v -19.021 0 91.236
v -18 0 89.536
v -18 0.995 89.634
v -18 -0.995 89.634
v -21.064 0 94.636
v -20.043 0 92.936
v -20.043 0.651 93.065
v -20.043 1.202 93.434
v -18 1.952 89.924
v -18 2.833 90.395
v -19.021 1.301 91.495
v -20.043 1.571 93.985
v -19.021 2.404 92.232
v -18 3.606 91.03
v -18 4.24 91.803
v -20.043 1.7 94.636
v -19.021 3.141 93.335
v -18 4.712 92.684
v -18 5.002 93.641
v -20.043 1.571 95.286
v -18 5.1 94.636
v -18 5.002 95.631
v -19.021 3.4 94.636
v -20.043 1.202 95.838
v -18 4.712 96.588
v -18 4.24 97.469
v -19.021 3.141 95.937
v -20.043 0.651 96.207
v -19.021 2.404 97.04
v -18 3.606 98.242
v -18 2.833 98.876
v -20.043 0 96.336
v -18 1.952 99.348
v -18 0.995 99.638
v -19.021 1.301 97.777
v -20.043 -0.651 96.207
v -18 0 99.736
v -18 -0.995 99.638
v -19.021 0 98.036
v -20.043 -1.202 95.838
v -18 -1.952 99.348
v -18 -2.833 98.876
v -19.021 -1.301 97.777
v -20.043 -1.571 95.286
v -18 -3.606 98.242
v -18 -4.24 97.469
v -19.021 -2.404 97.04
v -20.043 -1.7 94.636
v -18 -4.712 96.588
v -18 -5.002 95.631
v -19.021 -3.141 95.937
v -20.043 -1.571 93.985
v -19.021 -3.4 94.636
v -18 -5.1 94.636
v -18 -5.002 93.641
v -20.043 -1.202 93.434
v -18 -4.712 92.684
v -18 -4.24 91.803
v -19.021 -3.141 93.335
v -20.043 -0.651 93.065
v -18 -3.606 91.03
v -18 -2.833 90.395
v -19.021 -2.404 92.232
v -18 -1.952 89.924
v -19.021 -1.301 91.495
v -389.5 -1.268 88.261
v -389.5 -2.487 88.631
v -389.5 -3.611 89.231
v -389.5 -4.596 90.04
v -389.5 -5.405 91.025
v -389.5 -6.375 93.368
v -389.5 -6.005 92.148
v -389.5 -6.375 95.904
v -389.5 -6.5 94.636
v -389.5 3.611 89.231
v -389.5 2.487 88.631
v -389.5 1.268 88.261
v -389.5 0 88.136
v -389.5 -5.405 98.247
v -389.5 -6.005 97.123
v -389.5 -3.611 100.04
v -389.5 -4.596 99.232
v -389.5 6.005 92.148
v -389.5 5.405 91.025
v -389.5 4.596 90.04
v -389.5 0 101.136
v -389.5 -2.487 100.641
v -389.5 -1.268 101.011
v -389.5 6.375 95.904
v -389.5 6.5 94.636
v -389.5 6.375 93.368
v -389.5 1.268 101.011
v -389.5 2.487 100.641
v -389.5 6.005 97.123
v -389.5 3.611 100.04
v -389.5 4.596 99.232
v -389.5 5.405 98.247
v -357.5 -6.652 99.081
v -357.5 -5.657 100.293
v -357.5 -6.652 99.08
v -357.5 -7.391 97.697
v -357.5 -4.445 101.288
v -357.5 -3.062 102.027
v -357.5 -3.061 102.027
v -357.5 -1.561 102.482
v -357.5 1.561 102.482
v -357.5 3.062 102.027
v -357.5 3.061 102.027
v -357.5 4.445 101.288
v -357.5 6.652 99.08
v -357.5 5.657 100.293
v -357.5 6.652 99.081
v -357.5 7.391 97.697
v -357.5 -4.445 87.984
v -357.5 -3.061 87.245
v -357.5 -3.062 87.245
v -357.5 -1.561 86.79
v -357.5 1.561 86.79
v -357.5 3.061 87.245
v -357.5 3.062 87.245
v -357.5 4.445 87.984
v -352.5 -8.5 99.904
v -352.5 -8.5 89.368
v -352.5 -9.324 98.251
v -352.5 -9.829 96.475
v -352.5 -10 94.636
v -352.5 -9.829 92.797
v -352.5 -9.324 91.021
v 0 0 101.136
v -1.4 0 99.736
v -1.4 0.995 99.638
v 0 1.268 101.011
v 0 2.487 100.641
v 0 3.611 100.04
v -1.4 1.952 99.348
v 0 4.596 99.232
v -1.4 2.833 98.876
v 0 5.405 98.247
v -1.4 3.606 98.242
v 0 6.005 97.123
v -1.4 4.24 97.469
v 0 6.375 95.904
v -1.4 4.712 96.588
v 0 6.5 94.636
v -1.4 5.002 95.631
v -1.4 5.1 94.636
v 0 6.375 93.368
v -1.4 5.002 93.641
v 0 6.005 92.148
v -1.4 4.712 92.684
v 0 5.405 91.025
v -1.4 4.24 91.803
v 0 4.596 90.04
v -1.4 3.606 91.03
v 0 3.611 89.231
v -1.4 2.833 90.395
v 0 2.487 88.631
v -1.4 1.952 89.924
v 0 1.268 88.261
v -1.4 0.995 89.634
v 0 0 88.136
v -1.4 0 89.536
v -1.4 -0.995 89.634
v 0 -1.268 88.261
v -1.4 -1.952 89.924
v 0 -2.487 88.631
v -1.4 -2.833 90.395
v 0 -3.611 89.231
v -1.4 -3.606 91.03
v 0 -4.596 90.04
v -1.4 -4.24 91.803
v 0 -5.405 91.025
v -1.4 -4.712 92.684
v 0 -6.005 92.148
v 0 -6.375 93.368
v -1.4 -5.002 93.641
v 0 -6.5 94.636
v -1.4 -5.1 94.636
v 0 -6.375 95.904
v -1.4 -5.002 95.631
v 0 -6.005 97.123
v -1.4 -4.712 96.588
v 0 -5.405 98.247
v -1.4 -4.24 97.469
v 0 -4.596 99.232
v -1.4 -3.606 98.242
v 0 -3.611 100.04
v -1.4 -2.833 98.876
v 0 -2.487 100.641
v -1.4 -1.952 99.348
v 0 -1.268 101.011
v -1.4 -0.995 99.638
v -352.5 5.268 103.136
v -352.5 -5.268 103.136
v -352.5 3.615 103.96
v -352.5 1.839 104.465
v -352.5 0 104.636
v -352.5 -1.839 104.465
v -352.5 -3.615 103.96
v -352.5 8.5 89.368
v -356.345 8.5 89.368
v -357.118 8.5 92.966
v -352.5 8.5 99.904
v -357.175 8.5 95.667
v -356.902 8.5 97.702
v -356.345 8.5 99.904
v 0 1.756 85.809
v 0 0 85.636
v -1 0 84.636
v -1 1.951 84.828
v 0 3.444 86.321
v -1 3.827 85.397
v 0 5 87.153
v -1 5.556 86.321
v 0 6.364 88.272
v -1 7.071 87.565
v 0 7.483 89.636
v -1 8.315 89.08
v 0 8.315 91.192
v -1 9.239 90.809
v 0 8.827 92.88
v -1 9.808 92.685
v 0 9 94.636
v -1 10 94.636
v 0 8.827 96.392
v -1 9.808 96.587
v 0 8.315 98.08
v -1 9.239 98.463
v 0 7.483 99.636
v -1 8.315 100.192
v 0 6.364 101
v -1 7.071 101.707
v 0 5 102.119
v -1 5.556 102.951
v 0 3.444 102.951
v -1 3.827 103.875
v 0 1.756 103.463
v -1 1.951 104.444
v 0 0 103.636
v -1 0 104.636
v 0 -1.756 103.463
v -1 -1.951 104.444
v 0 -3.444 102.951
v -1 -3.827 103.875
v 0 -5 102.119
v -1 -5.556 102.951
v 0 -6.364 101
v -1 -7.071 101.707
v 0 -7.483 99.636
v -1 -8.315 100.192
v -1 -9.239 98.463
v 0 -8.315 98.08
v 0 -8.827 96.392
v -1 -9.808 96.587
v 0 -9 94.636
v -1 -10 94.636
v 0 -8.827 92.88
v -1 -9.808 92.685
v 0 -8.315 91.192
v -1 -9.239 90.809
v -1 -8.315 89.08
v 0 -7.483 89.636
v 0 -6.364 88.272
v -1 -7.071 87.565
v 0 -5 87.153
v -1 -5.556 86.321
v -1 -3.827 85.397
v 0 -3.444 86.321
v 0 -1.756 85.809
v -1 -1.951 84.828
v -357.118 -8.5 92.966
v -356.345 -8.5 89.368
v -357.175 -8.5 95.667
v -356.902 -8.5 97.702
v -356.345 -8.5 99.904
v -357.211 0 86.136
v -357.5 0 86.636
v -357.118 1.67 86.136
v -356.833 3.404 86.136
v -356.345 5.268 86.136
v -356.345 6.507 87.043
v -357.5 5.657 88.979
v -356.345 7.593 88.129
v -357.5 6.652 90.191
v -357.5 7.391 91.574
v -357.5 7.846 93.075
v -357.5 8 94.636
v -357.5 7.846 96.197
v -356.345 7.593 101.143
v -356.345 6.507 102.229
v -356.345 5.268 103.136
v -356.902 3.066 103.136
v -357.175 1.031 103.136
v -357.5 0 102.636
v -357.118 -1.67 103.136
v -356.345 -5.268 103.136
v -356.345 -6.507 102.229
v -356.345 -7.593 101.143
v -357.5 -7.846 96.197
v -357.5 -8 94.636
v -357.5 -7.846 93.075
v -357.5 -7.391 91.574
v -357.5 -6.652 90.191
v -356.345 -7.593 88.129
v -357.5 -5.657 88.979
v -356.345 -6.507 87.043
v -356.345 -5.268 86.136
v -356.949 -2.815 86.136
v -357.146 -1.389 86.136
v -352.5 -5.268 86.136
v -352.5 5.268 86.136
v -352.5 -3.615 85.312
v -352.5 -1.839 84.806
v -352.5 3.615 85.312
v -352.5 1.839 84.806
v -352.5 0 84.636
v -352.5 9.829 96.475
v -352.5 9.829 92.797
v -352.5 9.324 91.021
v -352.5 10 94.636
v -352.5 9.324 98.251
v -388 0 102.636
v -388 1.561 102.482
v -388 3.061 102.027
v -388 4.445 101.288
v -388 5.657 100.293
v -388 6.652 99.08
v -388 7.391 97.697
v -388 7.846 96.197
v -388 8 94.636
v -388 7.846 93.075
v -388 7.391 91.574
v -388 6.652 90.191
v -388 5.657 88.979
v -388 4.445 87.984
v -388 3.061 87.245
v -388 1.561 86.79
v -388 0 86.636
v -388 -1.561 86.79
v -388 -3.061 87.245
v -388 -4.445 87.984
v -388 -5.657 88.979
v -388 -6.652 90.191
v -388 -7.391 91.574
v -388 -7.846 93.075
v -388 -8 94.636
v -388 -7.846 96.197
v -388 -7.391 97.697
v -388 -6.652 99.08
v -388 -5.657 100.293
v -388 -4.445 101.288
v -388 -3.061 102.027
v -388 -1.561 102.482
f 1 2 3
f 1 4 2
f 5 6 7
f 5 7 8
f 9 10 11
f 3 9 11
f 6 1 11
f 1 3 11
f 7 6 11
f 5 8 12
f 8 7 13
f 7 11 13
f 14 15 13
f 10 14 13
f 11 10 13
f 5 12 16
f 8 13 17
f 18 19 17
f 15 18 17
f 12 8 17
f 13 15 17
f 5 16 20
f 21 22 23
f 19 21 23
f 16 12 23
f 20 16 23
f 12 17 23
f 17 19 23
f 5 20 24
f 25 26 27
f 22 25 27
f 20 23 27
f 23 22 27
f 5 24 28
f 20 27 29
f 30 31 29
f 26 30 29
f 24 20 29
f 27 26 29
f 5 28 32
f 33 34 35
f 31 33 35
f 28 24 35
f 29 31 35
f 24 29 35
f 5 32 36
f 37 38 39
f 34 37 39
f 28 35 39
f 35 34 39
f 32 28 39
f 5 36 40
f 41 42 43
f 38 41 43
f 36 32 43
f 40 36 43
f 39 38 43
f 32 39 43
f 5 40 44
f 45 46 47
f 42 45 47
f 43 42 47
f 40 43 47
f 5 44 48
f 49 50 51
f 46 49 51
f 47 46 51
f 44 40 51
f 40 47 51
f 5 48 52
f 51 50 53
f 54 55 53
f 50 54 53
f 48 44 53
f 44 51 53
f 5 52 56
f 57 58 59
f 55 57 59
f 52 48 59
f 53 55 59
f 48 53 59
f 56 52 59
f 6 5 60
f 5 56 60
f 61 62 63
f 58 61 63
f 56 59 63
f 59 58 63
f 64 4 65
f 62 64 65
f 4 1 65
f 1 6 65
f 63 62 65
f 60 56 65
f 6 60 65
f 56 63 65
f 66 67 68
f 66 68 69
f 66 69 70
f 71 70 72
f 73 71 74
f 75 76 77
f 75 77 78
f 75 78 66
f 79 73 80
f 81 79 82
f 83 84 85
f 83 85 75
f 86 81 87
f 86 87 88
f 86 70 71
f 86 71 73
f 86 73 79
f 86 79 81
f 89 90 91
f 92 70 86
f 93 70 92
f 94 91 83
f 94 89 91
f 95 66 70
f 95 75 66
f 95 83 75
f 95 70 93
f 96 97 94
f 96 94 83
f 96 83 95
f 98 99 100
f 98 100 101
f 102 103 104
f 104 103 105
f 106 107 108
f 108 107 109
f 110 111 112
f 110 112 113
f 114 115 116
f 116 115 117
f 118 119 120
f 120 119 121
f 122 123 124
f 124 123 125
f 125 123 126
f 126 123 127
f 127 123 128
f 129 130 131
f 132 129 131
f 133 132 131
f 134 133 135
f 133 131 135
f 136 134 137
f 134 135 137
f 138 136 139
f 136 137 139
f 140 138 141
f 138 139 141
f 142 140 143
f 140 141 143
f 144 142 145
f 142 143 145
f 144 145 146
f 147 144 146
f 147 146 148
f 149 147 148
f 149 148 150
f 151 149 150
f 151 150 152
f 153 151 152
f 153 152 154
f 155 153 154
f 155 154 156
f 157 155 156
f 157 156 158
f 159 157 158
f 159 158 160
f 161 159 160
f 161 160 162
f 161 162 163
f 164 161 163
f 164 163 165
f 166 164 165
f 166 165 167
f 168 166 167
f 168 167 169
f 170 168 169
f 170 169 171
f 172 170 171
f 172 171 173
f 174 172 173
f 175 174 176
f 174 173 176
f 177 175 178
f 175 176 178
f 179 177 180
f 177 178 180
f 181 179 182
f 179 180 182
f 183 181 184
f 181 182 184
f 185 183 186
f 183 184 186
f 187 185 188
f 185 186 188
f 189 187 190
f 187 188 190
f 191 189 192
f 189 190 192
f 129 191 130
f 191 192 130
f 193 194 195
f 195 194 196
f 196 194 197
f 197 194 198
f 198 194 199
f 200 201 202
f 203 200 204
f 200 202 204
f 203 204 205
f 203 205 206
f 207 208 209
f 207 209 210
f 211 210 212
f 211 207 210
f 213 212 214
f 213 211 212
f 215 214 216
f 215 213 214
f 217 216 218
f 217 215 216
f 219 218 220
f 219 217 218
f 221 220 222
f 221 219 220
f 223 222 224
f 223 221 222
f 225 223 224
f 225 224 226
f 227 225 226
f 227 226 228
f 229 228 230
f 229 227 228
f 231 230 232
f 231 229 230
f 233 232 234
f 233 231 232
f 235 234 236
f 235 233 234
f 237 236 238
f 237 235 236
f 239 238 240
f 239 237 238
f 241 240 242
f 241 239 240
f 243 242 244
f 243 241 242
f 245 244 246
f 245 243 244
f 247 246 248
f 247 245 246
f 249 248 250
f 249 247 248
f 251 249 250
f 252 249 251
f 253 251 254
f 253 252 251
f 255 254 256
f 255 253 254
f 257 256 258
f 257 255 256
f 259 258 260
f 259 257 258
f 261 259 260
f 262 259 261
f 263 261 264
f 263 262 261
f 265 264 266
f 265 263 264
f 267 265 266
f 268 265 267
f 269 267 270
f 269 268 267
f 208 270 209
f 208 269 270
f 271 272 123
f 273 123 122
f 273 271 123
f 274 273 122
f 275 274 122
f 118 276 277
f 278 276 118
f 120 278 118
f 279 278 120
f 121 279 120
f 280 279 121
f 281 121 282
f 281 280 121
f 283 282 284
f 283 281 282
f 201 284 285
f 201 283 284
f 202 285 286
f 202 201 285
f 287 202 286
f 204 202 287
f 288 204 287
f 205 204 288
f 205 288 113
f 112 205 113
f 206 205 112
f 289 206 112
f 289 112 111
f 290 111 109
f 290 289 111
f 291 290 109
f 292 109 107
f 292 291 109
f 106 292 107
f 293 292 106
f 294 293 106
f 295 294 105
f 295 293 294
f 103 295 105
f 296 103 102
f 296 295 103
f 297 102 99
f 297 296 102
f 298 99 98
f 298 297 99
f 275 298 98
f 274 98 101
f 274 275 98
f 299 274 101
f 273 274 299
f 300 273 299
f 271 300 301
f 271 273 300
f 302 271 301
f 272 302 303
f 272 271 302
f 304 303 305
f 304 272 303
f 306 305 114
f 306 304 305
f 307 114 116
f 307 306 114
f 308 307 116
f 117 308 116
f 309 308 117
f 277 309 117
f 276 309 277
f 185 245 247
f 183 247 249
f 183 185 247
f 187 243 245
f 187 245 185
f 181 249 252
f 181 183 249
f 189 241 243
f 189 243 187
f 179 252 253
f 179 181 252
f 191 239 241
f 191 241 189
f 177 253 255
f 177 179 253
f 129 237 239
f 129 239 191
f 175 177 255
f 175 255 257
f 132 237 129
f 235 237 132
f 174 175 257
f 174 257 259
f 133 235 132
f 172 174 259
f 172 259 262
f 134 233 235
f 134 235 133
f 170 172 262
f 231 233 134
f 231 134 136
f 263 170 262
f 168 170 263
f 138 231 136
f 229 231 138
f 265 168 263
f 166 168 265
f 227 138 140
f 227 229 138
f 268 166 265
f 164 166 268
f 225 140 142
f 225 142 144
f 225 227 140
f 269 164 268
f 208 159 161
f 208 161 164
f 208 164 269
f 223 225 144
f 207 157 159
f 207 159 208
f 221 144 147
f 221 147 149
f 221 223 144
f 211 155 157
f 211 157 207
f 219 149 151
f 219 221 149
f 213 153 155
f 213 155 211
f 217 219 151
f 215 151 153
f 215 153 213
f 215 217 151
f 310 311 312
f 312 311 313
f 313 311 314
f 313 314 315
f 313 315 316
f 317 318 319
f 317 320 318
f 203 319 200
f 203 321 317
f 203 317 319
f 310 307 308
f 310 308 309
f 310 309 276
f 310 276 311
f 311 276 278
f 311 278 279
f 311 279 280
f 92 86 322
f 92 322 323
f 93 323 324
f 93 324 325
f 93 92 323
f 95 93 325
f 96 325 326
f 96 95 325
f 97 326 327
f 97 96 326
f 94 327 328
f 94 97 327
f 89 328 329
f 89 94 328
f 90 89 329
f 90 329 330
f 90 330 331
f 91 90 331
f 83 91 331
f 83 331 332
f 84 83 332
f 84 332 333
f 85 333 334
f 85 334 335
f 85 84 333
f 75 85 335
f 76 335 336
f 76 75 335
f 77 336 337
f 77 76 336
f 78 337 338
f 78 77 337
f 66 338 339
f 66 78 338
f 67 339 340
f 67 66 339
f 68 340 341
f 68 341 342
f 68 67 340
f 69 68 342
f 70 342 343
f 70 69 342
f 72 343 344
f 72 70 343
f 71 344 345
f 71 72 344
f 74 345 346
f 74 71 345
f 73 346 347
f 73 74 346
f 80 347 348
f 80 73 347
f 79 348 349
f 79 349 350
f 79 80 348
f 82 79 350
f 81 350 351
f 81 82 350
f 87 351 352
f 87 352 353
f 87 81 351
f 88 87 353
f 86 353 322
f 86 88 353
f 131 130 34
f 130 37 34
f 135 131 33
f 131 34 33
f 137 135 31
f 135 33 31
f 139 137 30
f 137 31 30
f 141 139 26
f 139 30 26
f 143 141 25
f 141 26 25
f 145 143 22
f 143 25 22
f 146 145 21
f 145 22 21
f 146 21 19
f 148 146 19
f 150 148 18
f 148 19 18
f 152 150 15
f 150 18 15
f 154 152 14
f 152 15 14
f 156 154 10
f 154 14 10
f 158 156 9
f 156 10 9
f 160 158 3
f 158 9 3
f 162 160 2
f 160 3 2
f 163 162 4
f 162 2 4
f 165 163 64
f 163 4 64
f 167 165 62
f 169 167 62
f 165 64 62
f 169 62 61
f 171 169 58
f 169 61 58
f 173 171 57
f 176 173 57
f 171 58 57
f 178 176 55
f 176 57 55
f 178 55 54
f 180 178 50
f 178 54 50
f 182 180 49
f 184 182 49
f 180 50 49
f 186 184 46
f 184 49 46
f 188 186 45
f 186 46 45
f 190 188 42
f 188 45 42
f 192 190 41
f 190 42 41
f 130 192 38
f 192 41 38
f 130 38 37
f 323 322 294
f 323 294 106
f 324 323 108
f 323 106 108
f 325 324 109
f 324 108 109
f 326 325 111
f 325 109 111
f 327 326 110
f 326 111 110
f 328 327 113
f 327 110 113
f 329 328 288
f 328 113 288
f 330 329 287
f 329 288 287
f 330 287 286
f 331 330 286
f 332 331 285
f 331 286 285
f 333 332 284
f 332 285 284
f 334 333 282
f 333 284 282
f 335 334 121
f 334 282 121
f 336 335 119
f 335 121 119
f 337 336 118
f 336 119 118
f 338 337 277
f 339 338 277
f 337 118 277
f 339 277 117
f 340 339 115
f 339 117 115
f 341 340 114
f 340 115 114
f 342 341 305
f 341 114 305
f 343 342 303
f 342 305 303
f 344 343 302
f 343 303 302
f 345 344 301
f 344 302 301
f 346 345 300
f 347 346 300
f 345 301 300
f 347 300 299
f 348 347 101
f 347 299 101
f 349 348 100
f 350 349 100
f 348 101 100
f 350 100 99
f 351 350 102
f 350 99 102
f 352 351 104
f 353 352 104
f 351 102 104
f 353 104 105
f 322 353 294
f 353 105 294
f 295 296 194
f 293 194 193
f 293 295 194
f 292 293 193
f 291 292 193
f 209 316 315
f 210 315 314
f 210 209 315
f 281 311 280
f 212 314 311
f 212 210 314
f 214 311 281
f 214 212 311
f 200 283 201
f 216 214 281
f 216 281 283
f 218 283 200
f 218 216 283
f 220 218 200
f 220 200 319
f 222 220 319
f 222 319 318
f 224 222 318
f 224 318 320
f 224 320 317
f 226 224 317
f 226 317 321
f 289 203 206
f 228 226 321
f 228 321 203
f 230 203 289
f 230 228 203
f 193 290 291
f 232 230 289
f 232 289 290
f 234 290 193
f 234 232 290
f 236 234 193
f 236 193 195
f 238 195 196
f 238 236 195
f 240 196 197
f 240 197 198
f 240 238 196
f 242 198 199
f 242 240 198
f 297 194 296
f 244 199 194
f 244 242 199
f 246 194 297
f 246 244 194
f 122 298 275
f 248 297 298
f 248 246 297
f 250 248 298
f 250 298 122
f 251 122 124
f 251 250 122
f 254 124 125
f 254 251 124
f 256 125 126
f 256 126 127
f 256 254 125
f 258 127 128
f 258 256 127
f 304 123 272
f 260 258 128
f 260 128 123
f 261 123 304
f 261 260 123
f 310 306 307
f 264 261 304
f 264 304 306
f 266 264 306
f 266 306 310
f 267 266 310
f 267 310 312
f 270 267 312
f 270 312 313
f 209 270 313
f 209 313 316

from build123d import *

# Parameters (mm, degrees)
SZKIC1_R                          = 10
DODANIE_WYCI_GNI_CIE1_DEPTH       = 357.5
SZKIC2_R                          = 8
DODANIE_WYCI_GNI_CIE2_DEPTH       = 32
SFAZOWANIE1_SIZE                  = 1.5
SFAZOWANIE2_SIZE2                 = 1.154700538
SFAZOWANIE2_SIZE                  = 2
SZKIC3_W                          = 28.491583868
SZKIC3_H                          = 26.39290166
SZKIC3_W_2                        = 17
SZKIC3_H_2                        = 17
WYTNIJ_WYCI_GNI_CIE1_DEPTH        = 5
SFAZOWANIE3_SIZE                  = 1
OTW_R_GWINTOWANY_M121_D           = 10.2
OTW_R_GWINTOWANY_M121_DEPTH       = 18
OTW_R_GWINTOWANY_M121_CSINK_D     = 13
OTW_R_GWINTOWANY_M121_CSINK_ANGLE = 90
OTW_R_GWINTOWANY_M121_TIP         = 3.064389157


with BuildPart() as part:
    # Szkic1 → Dodanie-wyciągnięcie1 (new body)
    with BuildSketch(Plane(origin=(0, 0, 0), x_dir=(0, 0, -1), z_dir=(1, 0, 0))):
        with Locations((-94.635912223, 0)):
            Circle(SZKIC1_R)
    extrude(amount=-DODANIE_WYCI_GNI_CIE1_DEPTH)

    # Szkic2 → Dodanie-wyciągnięcie2 (add)
    with BuildSketch(Plane.ZY.offset(357.5)):
        with Locations((94.635912223, 0)):
            Circle(SZKIC2_R)
    extrude(amount=DODANIE_WYCI_GNI_CIE2_DEPTH)

    # Sfazowanie1
    sfazowanie1_edges = [part.edges().sort_by_distance(p)[0] for p in [
        (-389.5, 0, 86.635912223),
    ]]
    chamfer(sfazowanie1_edges, length=SFAZOWANIE1_SIZE)

    # Sfazowanie2
    sfazowanie2_edges = [part.edges().sort_by_distance(p)[0] for p in [
        (-357.5, 0, 104.635912223),
    ]]
    sfazowanie2_side = [part.faces().sort_by_distance(p)[0] for p in [
        (-357.5, 0, 104.612818213),
    ]]
    chamfer(sfazowanie2_edges, length=SFAZOWANIE2_SIZE - 0.0001, length2=SFAZOWANIE2_SIZE2 - 0.0001, reference=sfazowanie2_side[0])  # a hair under: the kernel refuses the full size

    # Szkic3 → Wytnij-wyciągnięcie1 (cut)
    with BuildSketch(Plane.ZY.offset(357.5)):
        with Locations((94.635912223, 0)):
            Rectangle(SZKIC3_W, SZKIC3_H)
        with Locations((94.635912223, 0)):
            Rectangle(SZKIC3_W_2, SZKIC3_H_2, mode=Mode.SUBTRACT)
    extrude(amount=-WYTNIJ_WYCI_GNI_CIE1_DEPTH, mode=Mode.SUBTRACT)

    # Sfazowanie3
    sfazowanie3_edges = [part.edges().sort_by_distance(p)[0] for p in [
        (0, 0, 104.635912223),
    ]]
    chamfer(sfazowanie3_edges, length=SFAZOWANIE3_SIZE)

    # Otwór gwintowany M121
    with Locations(Plane(origin=(0, 0, 0), x_dir=(0, 0, -1), z_dir=(1, 0, 0))):
        with Locations((-94.635912223, 0)):
            CounterSinkHole(OTW_R_GWINTOWANY_M121_D / 2, OTW_R_GWINTOWANY_M121_CSINK_D / 2, depth=OTW_R_GWINTOWANY_M121_DEPTH, counter_sink_angle=OTW_R_GWINTOWANY_M121_CSINK_ANGLE)
            with Locations((0, 0, -(OTW_R_GWINTOWANY_M121_DEPTH + OTW_R_GWINTOWANY_M121_TIP / 2))):  # 118° drill point
                Cone(0, OTW_R_GWINTOWANY_M121_D / 2, OTW_R_GWINTOWANY_M121_TIP, mode=Mode.SUBTRACT)


solid = part.part
